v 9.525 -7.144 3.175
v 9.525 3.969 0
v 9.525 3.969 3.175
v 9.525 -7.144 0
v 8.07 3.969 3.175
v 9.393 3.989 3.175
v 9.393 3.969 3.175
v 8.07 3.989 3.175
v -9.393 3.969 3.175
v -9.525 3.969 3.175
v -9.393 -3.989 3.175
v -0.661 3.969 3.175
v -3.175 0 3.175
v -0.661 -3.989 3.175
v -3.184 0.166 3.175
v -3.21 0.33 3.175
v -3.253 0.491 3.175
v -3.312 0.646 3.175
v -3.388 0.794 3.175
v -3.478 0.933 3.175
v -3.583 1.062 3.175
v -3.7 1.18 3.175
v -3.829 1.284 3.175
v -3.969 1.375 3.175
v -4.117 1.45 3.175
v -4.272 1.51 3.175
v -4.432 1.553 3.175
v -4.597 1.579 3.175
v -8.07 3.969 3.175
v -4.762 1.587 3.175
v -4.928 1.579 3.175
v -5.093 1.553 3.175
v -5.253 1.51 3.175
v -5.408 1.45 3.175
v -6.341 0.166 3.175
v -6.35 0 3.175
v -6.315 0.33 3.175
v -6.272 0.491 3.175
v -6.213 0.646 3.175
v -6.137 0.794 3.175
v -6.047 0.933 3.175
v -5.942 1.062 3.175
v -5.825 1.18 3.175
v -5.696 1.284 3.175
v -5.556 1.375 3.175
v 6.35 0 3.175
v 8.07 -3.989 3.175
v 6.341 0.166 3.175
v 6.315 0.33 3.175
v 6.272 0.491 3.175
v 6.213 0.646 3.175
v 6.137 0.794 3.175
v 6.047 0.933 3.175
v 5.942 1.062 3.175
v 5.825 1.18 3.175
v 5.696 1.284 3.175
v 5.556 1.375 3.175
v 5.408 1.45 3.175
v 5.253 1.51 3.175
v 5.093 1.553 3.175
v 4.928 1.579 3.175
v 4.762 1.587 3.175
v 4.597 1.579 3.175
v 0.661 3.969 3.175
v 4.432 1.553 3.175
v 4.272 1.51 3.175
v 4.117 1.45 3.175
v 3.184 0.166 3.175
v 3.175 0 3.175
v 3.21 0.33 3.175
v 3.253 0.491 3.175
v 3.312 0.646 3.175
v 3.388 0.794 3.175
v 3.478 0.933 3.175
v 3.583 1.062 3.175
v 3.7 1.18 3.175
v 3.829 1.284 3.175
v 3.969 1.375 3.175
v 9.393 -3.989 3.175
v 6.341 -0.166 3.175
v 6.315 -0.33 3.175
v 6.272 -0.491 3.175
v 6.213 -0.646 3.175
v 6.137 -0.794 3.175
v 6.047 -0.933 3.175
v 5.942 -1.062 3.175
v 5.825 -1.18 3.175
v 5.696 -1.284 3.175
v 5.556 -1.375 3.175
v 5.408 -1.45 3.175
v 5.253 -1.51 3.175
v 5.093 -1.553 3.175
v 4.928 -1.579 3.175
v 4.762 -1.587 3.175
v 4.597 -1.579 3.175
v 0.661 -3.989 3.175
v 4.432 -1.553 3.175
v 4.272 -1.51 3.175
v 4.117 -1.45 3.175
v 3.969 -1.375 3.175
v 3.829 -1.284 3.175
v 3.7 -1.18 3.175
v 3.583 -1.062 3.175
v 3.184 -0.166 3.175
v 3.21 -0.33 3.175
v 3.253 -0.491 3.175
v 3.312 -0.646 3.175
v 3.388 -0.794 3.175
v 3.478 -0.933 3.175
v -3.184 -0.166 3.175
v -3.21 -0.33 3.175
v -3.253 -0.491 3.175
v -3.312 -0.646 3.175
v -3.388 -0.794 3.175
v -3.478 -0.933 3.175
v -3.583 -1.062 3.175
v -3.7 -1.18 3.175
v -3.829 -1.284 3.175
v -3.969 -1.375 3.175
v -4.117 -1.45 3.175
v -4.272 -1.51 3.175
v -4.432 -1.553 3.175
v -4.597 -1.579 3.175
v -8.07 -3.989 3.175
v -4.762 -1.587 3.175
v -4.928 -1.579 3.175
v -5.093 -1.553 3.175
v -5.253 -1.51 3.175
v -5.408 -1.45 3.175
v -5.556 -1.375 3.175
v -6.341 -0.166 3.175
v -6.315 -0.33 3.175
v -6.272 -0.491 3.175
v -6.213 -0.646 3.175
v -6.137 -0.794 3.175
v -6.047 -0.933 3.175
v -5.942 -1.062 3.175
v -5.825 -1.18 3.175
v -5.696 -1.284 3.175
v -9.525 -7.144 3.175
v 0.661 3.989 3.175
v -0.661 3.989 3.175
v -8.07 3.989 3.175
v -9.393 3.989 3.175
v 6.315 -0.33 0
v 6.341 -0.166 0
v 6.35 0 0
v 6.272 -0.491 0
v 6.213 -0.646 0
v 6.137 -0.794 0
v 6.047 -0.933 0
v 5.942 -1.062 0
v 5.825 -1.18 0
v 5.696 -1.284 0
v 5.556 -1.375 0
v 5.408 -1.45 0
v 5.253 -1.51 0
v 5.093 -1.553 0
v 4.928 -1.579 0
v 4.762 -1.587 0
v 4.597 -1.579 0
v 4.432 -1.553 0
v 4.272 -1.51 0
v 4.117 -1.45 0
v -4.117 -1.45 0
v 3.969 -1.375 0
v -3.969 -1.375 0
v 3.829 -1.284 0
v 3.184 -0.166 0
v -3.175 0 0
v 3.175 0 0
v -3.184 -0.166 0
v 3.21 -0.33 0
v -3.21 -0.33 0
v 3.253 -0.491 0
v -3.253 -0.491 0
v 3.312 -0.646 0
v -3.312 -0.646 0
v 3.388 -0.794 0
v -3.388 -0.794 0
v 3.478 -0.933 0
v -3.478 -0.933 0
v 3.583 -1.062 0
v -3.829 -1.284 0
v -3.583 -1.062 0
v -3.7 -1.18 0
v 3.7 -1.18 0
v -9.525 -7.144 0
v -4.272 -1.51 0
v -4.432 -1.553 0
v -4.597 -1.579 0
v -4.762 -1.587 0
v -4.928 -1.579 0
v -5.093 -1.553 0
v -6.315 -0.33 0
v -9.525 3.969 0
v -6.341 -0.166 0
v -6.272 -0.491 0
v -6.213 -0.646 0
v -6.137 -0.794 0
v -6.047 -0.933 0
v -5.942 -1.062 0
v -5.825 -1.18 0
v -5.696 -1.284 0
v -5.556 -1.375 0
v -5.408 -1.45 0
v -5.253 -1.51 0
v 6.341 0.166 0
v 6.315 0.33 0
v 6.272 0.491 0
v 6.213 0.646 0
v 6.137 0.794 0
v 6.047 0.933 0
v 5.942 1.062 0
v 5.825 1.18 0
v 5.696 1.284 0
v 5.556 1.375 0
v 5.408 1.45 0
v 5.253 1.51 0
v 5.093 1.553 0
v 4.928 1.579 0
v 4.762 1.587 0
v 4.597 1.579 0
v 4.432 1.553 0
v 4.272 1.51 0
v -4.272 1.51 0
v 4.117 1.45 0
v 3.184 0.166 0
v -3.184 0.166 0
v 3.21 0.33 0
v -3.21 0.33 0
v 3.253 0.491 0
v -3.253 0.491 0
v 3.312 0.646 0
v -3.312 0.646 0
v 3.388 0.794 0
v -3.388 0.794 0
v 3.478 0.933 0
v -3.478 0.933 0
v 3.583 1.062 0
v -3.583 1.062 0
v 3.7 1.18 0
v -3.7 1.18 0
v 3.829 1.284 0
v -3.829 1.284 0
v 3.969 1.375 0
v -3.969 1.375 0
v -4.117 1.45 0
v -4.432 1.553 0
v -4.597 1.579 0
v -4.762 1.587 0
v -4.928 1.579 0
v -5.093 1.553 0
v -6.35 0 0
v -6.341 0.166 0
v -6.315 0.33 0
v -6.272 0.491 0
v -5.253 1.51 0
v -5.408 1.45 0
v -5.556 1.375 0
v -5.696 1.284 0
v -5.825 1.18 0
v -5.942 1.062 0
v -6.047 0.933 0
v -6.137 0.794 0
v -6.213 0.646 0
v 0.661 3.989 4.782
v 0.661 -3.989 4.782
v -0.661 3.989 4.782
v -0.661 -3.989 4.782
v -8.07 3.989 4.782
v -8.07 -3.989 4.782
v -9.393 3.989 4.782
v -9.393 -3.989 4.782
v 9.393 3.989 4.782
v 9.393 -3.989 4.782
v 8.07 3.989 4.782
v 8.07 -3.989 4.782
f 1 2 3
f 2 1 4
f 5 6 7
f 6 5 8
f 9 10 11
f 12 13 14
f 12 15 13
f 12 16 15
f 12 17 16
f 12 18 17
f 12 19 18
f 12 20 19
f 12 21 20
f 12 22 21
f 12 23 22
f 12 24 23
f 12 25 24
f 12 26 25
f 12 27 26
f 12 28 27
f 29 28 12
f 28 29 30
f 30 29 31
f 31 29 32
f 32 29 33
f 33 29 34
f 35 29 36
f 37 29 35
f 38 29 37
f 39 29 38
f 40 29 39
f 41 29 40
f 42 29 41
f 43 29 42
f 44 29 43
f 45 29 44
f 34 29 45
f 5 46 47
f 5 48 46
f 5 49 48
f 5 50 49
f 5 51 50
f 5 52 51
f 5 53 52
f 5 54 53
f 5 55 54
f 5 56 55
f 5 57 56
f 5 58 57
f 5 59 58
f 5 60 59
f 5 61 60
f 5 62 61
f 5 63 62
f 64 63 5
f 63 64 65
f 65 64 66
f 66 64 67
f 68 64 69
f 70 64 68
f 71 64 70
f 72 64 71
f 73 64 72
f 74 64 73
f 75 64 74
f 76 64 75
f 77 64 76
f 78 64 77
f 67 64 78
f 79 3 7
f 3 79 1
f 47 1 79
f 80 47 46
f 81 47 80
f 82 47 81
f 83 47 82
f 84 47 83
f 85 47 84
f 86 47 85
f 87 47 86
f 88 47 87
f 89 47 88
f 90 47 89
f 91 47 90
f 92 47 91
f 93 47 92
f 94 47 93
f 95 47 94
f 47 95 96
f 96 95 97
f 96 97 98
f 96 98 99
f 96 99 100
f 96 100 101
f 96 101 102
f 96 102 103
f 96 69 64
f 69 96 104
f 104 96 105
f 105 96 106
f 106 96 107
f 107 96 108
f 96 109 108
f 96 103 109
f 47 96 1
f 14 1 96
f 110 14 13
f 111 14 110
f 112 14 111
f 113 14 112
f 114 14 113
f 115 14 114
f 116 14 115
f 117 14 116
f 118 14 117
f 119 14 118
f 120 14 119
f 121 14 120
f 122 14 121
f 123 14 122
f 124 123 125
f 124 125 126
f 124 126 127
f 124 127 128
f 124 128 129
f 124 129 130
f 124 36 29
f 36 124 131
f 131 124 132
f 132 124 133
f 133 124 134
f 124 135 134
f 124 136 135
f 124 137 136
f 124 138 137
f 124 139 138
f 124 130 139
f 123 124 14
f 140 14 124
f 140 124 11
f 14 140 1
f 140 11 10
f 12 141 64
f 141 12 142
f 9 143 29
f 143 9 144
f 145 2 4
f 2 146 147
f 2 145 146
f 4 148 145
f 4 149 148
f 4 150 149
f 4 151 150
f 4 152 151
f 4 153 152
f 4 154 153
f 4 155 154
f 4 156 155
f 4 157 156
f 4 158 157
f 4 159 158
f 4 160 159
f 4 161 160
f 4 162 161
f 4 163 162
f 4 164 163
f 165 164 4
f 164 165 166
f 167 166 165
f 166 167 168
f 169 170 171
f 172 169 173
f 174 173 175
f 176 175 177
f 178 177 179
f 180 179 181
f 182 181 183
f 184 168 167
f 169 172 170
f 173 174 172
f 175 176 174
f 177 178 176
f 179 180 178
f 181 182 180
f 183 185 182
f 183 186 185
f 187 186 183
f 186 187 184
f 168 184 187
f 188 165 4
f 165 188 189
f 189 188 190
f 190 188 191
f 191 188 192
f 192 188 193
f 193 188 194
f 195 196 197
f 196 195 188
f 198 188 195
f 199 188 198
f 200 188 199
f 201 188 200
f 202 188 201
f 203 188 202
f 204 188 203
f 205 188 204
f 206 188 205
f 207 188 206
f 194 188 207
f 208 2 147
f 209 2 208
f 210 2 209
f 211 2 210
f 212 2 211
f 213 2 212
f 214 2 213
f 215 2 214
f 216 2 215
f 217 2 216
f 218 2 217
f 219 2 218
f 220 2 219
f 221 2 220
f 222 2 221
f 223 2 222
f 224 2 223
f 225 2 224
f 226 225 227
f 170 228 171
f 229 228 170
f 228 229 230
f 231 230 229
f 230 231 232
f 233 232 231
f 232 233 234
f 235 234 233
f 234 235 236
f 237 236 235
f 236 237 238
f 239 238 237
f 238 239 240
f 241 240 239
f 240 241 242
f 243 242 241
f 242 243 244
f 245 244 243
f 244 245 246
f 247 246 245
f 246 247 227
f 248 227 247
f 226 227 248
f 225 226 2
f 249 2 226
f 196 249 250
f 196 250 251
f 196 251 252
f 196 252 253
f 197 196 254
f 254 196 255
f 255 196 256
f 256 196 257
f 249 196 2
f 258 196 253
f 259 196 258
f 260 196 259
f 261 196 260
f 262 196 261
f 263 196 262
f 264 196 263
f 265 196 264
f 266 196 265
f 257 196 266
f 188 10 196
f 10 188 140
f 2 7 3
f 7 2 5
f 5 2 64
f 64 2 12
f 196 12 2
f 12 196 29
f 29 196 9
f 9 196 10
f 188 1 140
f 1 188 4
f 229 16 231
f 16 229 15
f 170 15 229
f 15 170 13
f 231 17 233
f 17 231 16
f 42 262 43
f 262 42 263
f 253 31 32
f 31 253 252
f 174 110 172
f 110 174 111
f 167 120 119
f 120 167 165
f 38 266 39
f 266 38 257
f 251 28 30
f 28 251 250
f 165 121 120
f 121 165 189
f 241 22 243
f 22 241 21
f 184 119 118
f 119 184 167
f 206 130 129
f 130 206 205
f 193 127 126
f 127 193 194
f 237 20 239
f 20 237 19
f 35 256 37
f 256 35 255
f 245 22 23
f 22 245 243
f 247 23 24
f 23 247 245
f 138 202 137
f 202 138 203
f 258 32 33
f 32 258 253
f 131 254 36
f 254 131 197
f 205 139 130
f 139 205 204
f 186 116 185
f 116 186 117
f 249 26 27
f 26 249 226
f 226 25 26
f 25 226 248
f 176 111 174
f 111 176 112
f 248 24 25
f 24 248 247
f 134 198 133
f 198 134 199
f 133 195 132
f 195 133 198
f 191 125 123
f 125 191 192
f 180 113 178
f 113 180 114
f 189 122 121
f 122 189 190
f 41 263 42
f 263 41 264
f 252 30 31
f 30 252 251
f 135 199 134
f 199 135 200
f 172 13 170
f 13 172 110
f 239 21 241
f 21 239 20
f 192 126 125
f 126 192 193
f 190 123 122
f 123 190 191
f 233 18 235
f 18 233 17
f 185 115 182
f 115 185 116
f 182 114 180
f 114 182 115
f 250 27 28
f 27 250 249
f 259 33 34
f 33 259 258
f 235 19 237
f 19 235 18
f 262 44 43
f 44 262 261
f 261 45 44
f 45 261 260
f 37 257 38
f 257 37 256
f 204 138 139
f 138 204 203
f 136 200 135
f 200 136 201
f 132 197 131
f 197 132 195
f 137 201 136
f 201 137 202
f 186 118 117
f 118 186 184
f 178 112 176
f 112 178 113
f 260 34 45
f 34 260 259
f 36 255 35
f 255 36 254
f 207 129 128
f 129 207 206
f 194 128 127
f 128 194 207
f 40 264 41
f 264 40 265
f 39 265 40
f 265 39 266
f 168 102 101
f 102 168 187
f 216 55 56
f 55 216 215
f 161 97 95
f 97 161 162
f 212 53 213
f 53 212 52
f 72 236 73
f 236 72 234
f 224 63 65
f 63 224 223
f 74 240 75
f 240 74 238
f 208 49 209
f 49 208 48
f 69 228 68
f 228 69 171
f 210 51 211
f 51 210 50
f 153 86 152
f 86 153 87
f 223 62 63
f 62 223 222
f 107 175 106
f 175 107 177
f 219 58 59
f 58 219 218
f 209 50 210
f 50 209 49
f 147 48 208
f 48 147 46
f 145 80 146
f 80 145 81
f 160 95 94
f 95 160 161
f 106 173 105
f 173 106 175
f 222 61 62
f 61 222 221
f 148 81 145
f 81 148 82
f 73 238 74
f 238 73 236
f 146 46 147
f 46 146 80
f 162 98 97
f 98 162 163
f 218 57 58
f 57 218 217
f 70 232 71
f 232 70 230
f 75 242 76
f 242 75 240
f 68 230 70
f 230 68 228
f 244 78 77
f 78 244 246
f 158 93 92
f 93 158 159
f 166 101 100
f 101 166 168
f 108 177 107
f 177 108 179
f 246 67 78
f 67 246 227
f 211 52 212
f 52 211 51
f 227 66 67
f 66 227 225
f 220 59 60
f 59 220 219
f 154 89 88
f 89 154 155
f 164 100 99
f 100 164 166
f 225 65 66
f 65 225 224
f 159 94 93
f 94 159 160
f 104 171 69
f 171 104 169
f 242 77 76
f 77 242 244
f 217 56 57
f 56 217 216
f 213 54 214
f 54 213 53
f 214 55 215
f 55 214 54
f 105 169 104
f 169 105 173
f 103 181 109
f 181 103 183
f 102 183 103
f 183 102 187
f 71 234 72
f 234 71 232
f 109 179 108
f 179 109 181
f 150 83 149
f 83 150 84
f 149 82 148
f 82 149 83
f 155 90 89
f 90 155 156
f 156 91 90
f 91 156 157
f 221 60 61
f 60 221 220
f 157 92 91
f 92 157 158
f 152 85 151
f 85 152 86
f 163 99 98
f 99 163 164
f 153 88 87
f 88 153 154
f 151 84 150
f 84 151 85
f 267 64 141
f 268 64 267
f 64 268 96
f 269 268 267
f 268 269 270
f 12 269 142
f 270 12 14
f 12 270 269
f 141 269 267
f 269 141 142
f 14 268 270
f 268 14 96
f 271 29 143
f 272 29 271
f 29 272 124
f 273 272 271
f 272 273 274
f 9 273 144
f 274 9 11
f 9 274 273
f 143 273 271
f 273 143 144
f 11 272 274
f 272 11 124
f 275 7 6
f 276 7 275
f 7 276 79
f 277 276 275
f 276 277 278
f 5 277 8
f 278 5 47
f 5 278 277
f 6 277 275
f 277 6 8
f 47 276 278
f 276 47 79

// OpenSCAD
// Breadboard retention clip: top part

// All units in mm

base_h = 9.525;      // 3/8 in
base_l = 3 * 6.35;   // 3/4 in
base_w = base_h - 1.5875; // 5/16 in

fudge = 0.02;

hole_r = 3.175/2;     // 1/8" diameter

// adjustment to give the rail some space to fit in the guide
// slots in the base
fit = (1.5875/6);

guide = 1.5875;      // 1/16 in, minus the "fit" adjustment

// overhang amount
overhang = 3.175;

// thickness of top piece
top_h = 3.175; // 1/8 in

module guide(extra_w, dx) {
    translate([-guide/2+dx, -base_w/2-fudge, 0])
        cube([guide+extra_w, base_w+2*fudge, guide+fudge]);
}

module screw_hole() {
    // screw hole    
    cylinder(r=hole_r, h=top_h + 2*fudge);
}

module plate() {
    color("olive")
    difference() {
        translate([-base_l/2, -base_w/2-overhang, 0])
            cube([base_l, base_w+overhang, top_h]);

        translate([-base_l/4, 0, -fudge]) screw_hole();

        translate([base_l/4, 0, -fudge]) screw_hole();
    }
}

module top() {
    plate();

    // center guide
    translate([0, 0, top_h]) guide(-fit, fit/2);
    
    // left guide
    translate([-base_l/2 + guide/2, 0, top_h]) guide(-fit, fit/2);
    
    // right guide
    translate([base_l/2 - guide/2, 0, top_h]) guide(-fit, fit/2);
}

$fn = 60;

//guide(0, 0);

//plate();

top();
